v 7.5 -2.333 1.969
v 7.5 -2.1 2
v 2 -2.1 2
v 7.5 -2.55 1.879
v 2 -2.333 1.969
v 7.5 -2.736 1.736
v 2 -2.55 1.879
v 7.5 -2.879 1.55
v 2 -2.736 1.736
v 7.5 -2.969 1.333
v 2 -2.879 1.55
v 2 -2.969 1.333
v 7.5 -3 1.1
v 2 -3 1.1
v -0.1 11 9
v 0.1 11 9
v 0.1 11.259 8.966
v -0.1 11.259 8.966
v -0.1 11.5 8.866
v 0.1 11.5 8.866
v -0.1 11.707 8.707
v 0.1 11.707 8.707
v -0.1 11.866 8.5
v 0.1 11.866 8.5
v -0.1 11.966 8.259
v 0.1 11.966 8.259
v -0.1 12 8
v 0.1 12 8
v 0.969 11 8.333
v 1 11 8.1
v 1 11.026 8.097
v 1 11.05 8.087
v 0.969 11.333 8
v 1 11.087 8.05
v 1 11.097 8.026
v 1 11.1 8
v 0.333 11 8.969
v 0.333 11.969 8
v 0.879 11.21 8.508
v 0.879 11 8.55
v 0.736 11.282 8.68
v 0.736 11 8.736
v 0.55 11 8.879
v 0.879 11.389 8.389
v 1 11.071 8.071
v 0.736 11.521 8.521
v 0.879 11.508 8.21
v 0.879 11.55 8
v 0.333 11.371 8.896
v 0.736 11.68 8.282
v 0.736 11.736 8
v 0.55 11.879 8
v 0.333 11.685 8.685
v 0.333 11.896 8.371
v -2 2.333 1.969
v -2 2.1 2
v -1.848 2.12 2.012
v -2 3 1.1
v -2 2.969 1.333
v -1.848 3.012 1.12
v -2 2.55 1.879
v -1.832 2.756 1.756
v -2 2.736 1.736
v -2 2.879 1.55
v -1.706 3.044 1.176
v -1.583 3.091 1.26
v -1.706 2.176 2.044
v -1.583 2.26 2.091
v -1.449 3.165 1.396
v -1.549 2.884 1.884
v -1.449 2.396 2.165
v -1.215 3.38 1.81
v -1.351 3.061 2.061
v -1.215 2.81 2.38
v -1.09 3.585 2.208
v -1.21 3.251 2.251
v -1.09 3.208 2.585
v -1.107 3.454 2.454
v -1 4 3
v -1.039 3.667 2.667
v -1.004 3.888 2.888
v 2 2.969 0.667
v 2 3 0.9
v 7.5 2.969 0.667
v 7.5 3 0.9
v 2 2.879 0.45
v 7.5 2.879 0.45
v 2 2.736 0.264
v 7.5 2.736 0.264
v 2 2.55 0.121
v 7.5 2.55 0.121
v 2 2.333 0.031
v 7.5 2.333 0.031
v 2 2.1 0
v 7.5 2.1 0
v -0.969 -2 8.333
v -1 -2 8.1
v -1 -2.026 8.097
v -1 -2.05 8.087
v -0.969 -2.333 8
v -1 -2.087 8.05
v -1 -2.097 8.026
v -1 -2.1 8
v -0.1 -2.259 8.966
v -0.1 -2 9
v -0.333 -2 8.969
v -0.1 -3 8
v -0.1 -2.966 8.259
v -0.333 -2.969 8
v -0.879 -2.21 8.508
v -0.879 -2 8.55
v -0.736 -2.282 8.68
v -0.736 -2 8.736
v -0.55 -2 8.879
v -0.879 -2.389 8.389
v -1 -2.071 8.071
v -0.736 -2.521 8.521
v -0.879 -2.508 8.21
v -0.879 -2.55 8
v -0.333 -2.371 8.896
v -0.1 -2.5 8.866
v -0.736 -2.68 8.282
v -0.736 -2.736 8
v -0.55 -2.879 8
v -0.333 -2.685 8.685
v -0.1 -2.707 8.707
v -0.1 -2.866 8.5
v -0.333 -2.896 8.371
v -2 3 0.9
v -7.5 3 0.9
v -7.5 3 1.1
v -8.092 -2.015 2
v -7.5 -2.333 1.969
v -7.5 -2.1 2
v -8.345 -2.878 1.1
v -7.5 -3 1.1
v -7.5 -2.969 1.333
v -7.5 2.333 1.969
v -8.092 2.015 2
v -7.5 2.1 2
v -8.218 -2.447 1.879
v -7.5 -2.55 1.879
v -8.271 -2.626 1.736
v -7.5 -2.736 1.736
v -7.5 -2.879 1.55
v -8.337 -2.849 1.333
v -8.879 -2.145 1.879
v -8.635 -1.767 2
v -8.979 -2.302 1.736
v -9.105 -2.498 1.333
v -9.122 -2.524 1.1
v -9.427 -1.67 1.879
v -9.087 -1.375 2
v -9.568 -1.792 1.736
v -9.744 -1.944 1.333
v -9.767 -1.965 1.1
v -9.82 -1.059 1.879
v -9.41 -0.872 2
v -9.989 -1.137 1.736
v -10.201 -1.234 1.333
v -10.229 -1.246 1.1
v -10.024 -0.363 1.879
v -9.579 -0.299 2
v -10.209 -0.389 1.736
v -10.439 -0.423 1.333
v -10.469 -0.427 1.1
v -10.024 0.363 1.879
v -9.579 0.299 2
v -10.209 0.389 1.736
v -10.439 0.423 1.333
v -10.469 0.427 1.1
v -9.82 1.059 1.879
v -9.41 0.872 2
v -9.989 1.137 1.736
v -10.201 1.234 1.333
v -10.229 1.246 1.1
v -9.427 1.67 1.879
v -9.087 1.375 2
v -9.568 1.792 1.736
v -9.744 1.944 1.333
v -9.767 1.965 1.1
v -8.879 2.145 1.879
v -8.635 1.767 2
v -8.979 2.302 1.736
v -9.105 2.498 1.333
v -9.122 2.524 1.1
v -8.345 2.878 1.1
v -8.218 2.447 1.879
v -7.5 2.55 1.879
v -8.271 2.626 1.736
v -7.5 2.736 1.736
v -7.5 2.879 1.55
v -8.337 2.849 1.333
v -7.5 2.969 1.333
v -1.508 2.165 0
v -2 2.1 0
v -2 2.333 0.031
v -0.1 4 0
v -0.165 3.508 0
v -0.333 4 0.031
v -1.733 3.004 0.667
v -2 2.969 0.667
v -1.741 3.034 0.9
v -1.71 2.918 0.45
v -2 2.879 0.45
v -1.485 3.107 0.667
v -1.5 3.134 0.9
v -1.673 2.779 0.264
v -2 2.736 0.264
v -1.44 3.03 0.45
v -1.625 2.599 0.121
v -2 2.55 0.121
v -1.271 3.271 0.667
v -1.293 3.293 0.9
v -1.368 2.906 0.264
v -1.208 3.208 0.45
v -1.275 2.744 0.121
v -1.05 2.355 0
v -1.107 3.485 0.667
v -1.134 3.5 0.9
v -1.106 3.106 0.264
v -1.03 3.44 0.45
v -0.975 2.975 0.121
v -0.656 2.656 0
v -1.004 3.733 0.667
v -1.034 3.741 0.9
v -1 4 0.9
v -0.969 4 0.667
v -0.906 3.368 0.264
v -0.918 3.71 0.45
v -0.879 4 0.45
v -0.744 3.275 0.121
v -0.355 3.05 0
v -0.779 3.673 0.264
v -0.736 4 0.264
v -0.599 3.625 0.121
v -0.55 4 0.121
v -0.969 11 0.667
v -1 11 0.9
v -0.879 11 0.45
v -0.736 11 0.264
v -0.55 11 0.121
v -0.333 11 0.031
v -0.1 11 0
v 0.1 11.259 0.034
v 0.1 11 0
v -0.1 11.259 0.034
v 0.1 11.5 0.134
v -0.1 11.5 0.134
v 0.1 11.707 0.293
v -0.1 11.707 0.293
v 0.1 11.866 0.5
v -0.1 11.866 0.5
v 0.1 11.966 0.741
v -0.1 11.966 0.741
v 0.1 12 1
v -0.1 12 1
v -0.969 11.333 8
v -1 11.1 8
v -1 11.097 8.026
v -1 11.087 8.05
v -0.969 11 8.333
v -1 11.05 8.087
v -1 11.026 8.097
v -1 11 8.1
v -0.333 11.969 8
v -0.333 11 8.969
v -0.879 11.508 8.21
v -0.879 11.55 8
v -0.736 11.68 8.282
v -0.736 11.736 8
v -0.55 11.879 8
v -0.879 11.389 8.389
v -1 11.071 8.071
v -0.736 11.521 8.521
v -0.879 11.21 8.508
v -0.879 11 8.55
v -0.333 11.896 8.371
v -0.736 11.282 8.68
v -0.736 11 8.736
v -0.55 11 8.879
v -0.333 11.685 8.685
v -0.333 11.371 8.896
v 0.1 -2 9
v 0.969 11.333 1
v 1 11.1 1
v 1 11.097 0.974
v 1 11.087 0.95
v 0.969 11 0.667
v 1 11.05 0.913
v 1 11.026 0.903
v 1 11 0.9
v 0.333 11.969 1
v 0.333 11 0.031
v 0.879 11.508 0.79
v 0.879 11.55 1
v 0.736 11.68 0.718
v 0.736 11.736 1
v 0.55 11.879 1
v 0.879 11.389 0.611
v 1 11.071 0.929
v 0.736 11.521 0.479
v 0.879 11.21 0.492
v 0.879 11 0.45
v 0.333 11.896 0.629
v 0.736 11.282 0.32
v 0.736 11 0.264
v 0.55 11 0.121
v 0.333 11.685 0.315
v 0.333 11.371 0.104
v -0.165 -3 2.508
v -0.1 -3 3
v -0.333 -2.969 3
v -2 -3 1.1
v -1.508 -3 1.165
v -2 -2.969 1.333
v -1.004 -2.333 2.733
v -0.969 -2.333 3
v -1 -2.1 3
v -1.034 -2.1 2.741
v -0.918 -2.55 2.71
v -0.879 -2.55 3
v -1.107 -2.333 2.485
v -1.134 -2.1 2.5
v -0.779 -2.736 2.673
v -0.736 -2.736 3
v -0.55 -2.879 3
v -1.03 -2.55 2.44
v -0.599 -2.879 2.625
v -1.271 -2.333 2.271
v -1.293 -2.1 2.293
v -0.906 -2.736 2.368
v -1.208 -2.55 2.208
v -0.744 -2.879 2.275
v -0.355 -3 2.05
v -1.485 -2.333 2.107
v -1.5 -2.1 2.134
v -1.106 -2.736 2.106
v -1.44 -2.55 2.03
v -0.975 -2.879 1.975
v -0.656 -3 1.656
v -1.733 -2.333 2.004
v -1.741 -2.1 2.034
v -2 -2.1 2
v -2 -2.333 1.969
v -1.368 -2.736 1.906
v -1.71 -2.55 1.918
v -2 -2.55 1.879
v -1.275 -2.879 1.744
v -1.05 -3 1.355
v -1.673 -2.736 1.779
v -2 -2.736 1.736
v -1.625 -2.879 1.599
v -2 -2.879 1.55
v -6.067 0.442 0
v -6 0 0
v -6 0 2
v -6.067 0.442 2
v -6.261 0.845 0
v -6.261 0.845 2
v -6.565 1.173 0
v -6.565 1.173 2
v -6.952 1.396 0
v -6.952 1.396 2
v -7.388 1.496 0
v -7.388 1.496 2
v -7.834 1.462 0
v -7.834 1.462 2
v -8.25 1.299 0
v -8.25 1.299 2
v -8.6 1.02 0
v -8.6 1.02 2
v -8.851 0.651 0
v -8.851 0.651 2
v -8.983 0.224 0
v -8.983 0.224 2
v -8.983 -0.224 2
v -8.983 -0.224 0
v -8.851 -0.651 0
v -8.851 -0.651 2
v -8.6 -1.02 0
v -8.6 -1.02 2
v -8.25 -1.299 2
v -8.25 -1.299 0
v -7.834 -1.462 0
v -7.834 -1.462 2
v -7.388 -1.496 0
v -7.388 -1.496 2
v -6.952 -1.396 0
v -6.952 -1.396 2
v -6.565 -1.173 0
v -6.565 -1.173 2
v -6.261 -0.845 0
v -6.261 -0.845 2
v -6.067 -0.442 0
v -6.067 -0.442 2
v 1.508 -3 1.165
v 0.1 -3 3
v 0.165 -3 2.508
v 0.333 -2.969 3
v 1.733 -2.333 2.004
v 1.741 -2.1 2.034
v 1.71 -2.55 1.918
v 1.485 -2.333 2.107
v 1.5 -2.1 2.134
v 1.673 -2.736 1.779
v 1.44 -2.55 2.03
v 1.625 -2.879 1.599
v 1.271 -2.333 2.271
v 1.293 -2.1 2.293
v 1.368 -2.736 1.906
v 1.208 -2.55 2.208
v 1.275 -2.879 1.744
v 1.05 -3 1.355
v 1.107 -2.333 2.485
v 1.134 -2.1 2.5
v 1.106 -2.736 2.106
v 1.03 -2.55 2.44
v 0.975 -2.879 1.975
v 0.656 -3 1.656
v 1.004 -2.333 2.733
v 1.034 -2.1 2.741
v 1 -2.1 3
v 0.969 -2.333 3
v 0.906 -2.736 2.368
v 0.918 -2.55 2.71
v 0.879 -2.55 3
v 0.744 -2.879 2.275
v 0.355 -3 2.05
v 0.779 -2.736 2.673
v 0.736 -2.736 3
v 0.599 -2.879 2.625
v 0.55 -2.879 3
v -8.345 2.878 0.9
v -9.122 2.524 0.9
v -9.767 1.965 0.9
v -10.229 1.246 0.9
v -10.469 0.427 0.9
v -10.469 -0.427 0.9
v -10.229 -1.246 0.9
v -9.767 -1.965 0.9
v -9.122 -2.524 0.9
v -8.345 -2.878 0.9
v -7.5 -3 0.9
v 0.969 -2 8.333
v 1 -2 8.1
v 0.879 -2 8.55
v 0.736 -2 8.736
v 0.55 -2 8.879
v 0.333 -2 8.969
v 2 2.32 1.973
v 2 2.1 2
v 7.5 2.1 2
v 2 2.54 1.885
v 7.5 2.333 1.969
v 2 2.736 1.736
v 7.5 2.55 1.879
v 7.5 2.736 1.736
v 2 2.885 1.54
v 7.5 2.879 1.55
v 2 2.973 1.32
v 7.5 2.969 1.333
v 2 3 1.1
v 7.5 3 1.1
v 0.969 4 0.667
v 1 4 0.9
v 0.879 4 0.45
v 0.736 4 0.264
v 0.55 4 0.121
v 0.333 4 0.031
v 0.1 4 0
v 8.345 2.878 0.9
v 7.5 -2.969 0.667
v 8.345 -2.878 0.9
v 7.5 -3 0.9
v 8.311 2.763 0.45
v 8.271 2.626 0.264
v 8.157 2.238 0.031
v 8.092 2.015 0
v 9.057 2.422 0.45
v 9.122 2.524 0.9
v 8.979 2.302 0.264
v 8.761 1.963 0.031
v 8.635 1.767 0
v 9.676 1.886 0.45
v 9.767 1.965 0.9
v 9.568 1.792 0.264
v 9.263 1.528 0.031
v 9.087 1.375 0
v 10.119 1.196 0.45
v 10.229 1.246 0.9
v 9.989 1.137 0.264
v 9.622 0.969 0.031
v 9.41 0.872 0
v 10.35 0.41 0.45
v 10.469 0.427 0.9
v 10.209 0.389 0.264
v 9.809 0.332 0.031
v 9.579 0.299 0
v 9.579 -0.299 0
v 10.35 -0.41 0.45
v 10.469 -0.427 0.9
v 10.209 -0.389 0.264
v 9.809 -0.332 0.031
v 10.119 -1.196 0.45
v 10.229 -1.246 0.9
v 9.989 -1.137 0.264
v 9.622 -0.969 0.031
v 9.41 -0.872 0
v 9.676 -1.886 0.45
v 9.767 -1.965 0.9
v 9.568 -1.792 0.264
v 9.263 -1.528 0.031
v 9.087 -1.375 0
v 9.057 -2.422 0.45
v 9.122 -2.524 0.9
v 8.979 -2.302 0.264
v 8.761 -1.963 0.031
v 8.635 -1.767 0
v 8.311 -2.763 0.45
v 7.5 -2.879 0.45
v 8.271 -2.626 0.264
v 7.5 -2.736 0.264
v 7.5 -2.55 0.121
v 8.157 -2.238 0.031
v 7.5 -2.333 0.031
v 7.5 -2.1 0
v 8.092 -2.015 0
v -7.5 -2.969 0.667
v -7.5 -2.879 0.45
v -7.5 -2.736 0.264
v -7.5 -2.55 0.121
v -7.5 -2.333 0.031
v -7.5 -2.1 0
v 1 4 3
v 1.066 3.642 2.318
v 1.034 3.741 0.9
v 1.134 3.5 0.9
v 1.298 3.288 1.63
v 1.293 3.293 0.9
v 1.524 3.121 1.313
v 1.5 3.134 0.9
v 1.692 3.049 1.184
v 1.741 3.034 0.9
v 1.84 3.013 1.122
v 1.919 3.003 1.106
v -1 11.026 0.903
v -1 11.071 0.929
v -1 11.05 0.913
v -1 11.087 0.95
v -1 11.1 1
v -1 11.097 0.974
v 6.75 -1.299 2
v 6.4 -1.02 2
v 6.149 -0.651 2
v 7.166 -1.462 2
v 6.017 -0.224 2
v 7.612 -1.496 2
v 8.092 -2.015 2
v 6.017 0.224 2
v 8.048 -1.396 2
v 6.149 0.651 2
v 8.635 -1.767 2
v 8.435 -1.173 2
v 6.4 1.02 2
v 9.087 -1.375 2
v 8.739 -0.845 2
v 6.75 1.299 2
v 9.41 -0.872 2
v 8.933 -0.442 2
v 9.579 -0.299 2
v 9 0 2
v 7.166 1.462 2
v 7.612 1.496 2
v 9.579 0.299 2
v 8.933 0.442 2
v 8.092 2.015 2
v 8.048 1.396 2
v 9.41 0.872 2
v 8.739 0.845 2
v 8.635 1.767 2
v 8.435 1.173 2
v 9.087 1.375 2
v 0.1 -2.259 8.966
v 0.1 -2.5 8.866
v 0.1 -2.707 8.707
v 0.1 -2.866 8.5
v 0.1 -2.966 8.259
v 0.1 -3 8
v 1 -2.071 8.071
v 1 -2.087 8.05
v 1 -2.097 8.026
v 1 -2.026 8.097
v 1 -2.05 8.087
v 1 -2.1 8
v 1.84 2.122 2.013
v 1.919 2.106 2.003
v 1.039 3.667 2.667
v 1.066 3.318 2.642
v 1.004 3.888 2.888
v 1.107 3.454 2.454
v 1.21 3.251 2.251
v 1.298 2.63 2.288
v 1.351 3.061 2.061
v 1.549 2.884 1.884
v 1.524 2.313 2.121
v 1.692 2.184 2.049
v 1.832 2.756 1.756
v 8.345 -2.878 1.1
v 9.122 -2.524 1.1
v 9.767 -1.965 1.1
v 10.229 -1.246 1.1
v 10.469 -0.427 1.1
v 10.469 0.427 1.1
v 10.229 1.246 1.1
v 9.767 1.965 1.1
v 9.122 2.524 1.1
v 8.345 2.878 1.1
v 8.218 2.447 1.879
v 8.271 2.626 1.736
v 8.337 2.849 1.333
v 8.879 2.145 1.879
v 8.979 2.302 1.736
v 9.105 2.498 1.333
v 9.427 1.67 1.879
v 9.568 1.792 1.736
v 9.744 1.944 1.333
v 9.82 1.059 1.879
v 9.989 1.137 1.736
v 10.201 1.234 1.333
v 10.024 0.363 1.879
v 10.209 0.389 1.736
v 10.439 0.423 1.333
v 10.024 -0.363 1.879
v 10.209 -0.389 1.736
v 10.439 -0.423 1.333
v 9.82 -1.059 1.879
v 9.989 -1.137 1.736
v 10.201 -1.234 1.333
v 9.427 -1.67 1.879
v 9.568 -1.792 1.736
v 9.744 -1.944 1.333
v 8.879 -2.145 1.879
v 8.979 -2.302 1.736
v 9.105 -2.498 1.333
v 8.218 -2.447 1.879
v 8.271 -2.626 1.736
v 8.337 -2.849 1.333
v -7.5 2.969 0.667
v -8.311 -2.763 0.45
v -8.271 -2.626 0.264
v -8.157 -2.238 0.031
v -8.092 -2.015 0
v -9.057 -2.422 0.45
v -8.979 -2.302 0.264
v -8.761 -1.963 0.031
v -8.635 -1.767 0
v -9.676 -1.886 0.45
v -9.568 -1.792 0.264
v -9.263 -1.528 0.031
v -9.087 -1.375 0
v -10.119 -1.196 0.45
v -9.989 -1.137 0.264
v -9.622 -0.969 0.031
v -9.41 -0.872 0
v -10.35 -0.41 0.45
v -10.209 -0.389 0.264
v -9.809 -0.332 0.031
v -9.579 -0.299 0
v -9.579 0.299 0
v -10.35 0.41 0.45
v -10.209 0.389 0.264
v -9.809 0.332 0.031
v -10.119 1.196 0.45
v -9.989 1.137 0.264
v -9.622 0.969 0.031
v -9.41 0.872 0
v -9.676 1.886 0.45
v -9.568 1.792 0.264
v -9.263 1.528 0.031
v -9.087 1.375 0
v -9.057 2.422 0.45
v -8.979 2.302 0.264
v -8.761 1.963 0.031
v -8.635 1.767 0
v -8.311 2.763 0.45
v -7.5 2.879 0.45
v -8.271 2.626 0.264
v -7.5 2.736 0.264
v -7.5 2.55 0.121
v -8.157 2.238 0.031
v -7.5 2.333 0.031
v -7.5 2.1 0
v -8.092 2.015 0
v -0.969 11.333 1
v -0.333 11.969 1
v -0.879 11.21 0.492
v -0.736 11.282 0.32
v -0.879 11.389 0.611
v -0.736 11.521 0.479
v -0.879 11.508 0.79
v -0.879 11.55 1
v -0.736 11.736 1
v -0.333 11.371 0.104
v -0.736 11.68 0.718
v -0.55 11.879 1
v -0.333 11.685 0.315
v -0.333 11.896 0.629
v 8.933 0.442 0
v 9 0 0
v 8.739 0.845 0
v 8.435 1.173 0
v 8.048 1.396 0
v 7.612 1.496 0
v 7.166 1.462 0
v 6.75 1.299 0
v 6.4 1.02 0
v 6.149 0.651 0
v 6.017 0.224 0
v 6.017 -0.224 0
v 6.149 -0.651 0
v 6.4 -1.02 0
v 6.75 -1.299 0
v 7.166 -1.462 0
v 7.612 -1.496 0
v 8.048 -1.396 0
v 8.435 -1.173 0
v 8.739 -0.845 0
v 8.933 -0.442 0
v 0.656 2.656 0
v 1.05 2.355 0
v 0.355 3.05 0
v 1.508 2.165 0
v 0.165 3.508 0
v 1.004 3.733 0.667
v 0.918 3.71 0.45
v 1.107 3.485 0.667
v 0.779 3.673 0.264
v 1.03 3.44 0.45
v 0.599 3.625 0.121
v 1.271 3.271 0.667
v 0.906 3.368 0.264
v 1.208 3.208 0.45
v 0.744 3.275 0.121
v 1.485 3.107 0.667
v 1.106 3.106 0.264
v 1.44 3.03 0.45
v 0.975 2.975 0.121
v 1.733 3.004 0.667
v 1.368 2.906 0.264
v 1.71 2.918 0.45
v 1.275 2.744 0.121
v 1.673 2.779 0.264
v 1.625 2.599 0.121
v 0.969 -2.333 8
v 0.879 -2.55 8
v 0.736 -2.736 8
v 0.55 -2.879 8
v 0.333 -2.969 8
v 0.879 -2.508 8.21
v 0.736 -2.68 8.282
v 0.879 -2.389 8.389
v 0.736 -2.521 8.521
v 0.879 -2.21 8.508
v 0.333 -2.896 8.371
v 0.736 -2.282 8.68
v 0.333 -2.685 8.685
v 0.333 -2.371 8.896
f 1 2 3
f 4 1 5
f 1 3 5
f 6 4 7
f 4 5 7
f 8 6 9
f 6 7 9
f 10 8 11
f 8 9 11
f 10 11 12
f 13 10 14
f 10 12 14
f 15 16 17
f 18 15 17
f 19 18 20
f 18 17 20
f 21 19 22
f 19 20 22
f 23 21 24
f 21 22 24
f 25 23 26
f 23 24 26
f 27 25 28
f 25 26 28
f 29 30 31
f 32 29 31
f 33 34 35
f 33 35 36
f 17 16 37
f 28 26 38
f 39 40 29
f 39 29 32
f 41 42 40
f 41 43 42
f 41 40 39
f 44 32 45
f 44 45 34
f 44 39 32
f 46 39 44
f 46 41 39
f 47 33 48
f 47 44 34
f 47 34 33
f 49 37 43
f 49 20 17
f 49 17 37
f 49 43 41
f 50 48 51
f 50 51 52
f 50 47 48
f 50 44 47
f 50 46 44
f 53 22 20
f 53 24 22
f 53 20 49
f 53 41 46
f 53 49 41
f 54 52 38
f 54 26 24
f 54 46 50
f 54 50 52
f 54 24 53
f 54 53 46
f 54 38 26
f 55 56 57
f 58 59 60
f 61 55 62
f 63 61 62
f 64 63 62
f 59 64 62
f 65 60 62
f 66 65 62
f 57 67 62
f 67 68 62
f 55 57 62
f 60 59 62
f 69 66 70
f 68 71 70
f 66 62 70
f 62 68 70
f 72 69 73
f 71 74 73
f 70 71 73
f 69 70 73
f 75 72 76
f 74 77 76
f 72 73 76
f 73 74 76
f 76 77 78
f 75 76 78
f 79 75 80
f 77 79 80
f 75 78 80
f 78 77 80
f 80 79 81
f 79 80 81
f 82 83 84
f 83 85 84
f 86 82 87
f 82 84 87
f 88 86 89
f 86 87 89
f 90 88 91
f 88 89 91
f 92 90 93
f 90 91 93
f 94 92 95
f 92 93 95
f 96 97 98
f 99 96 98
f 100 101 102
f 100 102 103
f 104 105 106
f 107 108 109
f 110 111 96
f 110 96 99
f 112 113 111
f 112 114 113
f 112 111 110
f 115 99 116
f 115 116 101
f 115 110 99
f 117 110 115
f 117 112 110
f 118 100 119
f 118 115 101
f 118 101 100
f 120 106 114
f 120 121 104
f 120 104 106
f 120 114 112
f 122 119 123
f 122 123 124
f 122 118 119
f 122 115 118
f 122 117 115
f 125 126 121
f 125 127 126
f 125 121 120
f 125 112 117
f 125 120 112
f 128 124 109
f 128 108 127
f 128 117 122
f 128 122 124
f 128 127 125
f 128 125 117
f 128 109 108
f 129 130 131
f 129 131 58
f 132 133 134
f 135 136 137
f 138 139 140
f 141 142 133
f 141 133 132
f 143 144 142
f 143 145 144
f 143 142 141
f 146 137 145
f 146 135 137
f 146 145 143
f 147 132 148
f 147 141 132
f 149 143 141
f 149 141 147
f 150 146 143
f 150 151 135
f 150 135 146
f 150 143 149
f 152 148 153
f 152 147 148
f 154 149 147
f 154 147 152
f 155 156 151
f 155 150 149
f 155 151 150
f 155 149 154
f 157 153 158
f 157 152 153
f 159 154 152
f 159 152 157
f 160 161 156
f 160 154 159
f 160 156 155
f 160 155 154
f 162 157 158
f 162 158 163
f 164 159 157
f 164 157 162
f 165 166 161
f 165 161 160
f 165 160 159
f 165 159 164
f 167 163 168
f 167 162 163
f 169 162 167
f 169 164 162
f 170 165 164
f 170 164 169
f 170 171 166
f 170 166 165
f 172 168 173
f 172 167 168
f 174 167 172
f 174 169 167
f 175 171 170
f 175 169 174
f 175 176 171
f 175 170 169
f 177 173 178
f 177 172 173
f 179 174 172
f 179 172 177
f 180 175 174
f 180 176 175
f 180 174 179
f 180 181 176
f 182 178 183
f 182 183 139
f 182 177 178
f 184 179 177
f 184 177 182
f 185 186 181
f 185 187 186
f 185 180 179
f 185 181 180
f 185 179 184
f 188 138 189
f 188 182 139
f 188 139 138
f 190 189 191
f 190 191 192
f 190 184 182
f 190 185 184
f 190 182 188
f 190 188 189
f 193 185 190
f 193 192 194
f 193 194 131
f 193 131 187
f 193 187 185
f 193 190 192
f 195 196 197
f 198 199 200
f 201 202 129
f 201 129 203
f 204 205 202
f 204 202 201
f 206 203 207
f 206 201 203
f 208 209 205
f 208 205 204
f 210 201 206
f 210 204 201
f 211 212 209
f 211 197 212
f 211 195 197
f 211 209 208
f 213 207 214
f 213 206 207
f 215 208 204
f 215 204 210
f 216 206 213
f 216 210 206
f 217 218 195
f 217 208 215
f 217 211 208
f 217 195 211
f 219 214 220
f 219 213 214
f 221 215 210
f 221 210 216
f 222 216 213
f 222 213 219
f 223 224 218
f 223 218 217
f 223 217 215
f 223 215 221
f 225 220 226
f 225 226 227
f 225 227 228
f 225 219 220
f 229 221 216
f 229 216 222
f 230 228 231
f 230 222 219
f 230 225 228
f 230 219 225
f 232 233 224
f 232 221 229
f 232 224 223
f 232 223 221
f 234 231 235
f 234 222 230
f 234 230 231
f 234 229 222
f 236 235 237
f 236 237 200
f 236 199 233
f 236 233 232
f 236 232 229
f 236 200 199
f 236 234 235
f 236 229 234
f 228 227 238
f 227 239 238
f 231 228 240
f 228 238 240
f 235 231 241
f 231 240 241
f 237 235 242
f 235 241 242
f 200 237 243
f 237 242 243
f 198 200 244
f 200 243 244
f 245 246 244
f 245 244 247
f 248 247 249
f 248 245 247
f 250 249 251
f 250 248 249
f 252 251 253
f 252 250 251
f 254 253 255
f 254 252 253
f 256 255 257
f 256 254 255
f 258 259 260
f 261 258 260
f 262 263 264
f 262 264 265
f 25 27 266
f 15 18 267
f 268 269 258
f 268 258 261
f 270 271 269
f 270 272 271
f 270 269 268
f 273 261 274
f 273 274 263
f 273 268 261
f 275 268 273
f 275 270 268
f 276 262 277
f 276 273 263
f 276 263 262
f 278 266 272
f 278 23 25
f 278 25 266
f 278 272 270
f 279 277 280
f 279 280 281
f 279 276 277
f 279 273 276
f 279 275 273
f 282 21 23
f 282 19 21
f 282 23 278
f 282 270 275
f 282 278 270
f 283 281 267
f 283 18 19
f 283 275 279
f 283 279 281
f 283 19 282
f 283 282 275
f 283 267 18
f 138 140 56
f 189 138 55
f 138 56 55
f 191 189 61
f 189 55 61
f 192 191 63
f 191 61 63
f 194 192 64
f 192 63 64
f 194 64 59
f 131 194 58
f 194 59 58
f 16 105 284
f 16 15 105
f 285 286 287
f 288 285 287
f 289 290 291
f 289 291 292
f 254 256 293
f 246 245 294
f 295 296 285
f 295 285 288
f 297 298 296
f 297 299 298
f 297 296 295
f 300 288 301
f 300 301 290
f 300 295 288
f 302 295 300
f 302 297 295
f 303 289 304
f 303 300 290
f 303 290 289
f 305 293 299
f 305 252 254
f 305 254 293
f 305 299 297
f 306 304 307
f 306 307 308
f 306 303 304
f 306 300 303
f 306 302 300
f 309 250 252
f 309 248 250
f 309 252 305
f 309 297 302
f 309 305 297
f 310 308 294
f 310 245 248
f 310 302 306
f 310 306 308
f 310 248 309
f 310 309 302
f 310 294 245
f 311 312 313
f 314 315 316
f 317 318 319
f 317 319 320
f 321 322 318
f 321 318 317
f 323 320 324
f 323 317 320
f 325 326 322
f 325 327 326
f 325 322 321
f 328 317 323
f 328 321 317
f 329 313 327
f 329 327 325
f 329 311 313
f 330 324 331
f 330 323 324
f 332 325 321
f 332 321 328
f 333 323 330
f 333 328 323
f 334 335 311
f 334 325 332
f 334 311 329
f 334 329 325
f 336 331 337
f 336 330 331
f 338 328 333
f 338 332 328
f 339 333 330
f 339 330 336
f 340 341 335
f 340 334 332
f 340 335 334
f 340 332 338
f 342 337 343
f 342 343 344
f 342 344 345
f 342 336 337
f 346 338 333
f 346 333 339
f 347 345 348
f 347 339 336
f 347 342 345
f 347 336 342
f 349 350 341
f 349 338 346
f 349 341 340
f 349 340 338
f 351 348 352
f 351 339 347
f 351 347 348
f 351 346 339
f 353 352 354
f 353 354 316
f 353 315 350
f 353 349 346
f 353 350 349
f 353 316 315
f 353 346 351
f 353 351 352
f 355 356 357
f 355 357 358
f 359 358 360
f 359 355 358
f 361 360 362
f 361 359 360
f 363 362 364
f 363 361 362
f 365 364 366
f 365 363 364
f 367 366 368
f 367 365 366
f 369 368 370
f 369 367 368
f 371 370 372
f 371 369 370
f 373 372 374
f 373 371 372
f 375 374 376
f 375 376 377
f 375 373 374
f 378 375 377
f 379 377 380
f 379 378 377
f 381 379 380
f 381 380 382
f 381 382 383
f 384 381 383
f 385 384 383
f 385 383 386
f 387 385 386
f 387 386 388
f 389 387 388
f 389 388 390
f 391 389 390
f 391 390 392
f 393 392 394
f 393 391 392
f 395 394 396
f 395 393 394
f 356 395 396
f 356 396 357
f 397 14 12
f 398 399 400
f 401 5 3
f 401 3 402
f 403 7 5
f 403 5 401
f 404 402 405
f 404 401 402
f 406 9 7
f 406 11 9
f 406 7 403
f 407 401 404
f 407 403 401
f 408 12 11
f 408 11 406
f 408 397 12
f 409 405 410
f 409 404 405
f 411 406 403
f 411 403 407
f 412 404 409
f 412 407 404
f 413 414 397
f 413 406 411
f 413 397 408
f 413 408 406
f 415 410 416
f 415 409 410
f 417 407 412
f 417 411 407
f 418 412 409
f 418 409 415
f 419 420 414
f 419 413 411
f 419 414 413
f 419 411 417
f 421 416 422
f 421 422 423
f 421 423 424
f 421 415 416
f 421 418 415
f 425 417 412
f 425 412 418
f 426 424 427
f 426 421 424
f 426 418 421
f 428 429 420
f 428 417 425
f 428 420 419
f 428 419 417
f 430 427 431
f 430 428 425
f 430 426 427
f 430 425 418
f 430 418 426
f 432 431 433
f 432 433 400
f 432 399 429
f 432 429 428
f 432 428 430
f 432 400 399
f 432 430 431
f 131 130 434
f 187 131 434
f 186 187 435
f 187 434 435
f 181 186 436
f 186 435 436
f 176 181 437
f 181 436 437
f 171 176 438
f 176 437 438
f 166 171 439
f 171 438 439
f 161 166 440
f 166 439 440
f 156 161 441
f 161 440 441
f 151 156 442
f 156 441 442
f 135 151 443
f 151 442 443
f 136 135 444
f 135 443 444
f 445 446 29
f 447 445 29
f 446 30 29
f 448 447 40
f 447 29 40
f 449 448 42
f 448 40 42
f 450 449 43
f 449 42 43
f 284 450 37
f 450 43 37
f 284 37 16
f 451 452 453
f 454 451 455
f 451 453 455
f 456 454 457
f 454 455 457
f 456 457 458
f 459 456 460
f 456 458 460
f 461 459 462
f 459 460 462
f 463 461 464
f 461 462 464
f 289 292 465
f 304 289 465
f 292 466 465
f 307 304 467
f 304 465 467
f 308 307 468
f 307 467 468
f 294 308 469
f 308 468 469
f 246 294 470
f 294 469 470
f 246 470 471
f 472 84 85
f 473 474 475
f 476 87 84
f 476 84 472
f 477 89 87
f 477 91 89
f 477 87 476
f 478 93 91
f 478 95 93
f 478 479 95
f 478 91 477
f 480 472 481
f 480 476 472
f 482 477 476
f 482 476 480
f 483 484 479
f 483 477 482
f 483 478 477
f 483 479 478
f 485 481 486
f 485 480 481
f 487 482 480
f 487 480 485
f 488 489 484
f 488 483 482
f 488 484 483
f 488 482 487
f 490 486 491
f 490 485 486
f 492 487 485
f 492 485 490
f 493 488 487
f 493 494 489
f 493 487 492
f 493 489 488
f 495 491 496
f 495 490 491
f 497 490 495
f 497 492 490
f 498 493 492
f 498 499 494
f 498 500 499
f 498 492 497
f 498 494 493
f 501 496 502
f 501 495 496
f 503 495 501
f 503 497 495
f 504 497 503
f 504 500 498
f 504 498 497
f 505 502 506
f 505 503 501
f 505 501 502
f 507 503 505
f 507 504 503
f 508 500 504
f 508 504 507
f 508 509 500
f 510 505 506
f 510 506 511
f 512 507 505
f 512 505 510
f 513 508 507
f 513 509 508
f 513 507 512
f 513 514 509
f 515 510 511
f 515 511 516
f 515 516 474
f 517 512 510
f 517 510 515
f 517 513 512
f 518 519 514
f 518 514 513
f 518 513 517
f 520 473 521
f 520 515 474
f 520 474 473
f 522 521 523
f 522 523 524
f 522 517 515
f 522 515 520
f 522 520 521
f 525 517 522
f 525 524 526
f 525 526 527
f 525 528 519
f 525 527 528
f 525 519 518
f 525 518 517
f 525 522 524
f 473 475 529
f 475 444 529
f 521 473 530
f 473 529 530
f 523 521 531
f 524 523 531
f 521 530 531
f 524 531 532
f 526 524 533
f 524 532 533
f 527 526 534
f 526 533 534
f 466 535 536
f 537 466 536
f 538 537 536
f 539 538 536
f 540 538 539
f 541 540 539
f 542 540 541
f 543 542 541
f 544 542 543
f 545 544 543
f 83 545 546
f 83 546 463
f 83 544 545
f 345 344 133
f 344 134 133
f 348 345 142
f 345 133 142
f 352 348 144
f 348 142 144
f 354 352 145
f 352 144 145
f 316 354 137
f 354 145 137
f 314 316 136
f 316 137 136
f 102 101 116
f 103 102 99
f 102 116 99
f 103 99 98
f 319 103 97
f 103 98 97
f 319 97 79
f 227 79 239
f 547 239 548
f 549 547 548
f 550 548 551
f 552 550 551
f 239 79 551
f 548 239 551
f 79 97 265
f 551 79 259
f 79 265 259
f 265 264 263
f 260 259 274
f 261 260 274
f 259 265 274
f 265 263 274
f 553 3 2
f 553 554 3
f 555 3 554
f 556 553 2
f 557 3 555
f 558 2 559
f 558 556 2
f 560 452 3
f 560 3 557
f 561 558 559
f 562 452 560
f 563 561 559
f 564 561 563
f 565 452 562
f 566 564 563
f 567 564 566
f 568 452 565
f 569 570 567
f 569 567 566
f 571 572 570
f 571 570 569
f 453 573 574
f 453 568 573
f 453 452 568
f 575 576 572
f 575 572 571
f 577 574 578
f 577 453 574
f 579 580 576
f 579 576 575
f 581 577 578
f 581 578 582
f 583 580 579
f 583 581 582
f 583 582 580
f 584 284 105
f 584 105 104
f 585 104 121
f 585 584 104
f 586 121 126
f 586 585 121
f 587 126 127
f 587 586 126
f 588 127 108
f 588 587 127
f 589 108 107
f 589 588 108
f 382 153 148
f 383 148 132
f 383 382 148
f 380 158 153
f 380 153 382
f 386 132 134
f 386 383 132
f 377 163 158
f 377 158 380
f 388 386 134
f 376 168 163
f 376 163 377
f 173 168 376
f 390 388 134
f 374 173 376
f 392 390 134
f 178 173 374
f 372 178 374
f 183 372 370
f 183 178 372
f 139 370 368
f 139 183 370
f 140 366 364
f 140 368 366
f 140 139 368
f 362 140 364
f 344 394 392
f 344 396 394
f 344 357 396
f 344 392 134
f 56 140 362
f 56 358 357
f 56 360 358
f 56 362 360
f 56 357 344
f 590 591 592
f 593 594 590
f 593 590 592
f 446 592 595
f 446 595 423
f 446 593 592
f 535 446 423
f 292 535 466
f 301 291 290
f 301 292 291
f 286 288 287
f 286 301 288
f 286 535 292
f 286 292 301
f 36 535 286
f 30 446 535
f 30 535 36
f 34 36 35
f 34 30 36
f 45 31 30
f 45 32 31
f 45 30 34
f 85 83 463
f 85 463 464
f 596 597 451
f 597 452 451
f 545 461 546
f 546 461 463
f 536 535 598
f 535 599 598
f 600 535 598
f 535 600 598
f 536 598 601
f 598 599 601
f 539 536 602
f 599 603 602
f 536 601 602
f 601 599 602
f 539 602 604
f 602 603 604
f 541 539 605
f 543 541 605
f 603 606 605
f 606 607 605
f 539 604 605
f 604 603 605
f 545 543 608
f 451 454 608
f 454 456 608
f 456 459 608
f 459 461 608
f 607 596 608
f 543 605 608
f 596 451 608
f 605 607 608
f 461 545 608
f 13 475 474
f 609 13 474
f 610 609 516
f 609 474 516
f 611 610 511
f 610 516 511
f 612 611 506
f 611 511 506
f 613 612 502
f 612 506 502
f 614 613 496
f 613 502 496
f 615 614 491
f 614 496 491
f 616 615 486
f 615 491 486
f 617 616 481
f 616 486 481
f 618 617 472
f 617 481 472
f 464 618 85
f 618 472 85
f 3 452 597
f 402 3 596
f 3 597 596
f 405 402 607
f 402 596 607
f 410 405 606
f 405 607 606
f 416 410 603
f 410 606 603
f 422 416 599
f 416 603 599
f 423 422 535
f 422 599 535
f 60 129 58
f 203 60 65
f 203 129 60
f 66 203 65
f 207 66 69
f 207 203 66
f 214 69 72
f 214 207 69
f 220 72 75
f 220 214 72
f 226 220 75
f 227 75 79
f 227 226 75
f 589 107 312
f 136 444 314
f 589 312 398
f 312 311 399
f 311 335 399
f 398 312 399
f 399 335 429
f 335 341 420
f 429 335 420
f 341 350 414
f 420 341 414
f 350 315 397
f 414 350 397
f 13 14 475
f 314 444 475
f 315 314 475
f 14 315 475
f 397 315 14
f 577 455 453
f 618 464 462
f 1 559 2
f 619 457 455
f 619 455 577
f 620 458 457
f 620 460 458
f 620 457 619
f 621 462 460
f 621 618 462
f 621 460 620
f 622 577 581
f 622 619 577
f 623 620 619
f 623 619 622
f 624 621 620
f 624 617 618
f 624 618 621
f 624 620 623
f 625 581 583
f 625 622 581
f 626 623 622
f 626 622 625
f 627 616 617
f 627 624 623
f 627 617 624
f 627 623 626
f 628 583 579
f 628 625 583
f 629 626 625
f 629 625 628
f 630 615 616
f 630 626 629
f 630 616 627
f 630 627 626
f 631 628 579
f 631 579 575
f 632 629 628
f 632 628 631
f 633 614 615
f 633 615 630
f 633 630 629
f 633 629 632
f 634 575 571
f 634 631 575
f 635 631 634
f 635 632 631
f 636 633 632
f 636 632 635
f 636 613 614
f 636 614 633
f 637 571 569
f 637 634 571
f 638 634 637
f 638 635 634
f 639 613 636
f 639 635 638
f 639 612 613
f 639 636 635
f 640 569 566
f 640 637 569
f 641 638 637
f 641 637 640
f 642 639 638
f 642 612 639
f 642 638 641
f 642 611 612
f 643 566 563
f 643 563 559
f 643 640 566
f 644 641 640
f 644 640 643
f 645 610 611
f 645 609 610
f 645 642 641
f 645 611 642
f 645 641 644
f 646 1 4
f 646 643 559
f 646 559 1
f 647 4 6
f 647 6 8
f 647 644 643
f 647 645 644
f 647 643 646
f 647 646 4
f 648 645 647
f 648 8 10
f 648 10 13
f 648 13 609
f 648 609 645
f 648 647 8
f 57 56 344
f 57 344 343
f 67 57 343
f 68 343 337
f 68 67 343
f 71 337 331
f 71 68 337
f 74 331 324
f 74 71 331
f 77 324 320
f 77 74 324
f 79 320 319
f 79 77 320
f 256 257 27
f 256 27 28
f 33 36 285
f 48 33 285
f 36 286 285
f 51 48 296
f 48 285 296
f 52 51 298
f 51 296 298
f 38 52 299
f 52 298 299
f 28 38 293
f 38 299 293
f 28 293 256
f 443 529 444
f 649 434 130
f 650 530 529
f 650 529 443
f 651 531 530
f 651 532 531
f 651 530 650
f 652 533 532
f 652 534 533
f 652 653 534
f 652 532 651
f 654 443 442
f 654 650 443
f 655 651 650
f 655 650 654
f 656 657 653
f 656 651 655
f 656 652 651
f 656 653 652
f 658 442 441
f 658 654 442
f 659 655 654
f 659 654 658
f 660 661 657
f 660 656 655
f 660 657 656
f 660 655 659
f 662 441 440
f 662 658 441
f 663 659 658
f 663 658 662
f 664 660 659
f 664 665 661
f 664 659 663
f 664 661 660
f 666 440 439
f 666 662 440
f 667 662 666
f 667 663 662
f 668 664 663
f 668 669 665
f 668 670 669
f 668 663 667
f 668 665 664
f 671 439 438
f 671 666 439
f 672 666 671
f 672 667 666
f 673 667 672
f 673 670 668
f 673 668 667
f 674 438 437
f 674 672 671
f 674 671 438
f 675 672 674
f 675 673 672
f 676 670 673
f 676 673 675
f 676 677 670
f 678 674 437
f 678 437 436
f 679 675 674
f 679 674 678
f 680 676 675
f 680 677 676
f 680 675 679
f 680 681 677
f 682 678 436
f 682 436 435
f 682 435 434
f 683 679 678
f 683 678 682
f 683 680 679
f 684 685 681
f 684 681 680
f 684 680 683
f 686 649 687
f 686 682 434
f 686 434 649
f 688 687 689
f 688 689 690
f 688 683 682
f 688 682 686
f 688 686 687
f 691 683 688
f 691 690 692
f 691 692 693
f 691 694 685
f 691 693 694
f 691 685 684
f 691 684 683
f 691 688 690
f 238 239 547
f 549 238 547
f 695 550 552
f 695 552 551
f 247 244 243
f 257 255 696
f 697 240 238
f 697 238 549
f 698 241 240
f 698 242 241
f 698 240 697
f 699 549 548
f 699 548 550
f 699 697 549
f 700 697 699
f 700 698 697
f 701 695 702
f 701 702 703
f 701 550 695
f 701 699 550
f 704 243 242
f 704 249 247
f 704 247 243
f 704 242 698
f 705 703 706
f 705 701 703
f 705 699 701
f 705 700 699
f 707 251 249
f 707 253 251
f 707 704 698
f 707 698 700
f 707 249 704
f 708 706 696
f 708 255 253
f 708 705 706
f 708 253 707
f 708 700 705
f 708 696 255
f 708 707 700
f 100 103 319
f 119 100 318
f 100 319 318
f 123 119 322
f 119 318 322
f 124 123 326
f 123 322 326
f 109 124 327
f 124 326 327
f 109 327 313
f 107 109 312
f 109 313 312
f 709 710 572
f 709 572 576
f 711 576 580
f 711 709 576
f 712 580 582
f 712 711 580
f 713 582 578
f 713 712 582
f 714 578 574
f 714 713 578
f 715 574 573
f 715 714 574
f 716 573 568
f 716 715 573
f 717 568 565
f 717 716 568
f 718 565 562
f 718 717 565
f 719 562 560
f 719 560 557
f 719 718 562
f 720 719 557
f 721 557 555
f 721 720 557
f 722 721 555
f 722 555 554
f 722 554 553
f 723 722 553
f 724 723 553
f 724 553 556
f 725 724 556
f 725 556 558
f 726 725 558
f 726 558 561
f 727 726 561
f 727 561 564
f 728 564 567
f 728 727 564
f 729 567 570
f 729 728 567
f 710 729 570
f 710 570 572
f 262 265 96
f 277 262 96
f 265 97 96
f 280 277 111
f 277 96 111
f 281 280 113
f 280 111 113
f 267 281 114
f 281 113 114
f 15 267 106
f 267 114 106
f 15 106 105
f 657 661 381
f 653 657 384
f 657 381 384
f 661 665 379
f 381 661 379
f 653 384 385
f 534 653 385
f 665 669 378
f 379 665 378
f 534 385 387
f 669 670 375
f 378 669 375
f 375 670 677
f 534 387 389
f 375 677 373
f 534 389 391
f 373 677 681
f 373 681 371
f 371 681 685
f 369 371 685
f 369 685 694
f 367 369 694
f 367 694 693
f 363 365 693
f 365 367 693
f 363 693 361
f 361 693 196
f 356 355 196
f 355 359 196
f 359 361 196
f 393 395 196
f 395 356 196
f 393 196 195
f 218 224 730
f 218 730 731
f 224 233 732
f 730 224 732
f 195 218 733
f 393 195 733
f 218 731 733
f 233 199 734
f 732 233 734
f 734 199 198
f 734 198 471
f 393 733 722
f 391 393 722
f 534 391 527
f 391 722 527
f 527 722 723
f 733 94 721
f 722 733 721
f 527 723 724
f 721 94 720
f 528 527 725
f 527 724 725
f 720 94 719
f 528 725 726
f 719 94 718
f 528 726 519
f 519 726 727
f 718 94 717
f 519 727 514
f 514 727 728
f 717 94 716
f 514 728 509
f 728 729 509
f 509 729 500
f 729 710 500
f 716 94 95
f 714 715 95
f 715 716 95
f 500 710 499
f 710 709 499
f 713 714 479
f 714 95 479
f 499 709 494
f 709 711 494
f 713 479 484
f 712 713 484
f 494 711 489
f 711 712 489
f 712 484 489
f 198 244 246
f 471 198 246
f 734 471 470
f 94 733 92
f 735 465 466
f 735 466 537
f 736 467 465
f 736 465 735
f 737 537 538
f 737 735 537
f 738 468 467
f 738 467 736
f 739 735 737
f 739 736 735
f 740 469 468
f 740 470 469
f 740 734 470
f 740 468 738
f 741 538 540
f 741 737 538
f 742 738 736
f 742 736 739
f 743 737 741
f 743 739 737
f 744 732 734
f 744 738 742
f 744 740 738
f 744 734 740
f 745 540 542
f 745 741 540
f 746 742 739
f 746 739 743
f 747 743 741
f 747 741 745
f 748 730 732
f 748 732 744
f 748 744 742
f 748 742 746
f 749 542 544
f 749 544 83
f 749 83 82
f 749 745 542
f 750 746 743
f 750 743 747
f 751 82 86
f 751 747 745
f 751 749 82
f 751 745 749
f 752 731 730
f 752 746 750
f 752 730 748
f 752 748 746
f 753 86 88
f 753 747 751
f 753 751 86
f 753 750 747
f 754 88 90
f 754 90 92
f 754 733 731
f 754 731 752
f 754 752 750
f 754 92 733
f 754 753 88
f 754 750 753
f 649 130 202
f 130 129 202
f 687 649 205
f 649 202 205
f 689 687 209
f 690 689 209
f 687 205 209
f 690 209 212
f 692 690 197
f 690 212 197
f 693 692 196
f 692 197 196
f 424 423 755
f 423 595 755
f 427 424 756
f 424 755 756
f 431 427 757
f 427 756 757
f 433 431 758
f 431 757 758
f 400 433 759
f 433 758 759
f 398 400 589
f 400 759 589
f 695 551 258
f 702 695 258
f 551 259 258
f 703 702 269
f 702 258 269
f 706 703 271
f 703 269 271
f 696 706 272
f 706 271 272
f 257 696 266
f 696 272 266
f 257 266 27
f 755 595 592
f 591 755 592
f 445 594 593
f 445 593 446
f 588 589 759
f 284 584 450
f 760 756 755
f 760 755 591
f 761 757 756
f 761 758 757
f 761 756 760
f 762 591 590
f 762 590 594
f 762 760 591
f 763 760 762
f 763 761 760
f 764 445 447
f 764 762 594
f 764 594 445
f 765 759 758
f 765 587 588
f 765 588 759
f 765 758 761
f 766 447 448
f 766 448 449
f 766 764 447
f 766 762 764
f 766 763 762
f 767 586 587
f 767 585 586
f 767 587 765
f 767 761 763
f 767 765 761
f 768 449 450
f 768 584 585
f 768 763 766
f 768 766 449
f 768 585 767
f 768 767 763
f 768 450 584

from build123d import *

# Parameters (mm, degrees)
SKETCH_R          = 1.5
PAD_DEPTH         = 2
SKETCH001_W       = 2
SKETCH001_H       = 15
PAD001_DEPTH      = 7
PAD001_DEPTH_BACK = 2
FILLET_R          = 1
FILLET001_R       = 0.9


with BuildPart() as part:
    # Sketch → Pad (new body)
    with BuildSketch(Plane.XY):
        with BuildLine():
            ThreePointArc((-7.5, 3), (-10.5, 0), (-7.5, -3))
            Line((-7.5, -3), (7.5, -3))
            ThreePointArc((7.5, -3), (10.5, 0), (7.5, 3))
            Line((-7.5, 3), (7.5, 3))
        make_face()
        with Locations((-7.5, 0)):
            Circle(SKETCH_R, mode=Mode.SUBTRACT)
        with Locations((7.5, 0)):
            Circle(SKETCH_R, mode=Mode.SUBTRACT)
    extrude(amount=PAD_DEPTH)

    # Sketch001 (on Face8 of Pad) → Pad001 (join, two sides)
    with BuildSketch(Plane.XY.offset(2)) as pad001_sk:
        with Locations((0, 4.5)):
            Rectangle(SKETCH001_W, SKETCH001_H)
    extrude(amount=PAD001_DEPTH)
    extrude(pad001_sk.sketch, amount=-PAD001_DEPTH_BACK)

    # Fillet
    fillet_edges = [part.edges().sort_by_distance(p)[0] for p in [
        (1, 0, 2),
        (-1, 0, 2),
        (0, -3, 9),
        (0, 12, 9),
        (0, 12, 0),
        (1, 3, 1),
        (-1, 3, 1),
    ]]
    fillet(fillet_edges, radius=FILLET_R)

    # Fillet001
    fillet001_edges = [part.edges().sort_by_distance(p)[0] for p in [
        (1, 11.707107, 8.707107),
    ]]
    fillet(fillet001_edges, radius=FILLET001_R)


solid = part.part
